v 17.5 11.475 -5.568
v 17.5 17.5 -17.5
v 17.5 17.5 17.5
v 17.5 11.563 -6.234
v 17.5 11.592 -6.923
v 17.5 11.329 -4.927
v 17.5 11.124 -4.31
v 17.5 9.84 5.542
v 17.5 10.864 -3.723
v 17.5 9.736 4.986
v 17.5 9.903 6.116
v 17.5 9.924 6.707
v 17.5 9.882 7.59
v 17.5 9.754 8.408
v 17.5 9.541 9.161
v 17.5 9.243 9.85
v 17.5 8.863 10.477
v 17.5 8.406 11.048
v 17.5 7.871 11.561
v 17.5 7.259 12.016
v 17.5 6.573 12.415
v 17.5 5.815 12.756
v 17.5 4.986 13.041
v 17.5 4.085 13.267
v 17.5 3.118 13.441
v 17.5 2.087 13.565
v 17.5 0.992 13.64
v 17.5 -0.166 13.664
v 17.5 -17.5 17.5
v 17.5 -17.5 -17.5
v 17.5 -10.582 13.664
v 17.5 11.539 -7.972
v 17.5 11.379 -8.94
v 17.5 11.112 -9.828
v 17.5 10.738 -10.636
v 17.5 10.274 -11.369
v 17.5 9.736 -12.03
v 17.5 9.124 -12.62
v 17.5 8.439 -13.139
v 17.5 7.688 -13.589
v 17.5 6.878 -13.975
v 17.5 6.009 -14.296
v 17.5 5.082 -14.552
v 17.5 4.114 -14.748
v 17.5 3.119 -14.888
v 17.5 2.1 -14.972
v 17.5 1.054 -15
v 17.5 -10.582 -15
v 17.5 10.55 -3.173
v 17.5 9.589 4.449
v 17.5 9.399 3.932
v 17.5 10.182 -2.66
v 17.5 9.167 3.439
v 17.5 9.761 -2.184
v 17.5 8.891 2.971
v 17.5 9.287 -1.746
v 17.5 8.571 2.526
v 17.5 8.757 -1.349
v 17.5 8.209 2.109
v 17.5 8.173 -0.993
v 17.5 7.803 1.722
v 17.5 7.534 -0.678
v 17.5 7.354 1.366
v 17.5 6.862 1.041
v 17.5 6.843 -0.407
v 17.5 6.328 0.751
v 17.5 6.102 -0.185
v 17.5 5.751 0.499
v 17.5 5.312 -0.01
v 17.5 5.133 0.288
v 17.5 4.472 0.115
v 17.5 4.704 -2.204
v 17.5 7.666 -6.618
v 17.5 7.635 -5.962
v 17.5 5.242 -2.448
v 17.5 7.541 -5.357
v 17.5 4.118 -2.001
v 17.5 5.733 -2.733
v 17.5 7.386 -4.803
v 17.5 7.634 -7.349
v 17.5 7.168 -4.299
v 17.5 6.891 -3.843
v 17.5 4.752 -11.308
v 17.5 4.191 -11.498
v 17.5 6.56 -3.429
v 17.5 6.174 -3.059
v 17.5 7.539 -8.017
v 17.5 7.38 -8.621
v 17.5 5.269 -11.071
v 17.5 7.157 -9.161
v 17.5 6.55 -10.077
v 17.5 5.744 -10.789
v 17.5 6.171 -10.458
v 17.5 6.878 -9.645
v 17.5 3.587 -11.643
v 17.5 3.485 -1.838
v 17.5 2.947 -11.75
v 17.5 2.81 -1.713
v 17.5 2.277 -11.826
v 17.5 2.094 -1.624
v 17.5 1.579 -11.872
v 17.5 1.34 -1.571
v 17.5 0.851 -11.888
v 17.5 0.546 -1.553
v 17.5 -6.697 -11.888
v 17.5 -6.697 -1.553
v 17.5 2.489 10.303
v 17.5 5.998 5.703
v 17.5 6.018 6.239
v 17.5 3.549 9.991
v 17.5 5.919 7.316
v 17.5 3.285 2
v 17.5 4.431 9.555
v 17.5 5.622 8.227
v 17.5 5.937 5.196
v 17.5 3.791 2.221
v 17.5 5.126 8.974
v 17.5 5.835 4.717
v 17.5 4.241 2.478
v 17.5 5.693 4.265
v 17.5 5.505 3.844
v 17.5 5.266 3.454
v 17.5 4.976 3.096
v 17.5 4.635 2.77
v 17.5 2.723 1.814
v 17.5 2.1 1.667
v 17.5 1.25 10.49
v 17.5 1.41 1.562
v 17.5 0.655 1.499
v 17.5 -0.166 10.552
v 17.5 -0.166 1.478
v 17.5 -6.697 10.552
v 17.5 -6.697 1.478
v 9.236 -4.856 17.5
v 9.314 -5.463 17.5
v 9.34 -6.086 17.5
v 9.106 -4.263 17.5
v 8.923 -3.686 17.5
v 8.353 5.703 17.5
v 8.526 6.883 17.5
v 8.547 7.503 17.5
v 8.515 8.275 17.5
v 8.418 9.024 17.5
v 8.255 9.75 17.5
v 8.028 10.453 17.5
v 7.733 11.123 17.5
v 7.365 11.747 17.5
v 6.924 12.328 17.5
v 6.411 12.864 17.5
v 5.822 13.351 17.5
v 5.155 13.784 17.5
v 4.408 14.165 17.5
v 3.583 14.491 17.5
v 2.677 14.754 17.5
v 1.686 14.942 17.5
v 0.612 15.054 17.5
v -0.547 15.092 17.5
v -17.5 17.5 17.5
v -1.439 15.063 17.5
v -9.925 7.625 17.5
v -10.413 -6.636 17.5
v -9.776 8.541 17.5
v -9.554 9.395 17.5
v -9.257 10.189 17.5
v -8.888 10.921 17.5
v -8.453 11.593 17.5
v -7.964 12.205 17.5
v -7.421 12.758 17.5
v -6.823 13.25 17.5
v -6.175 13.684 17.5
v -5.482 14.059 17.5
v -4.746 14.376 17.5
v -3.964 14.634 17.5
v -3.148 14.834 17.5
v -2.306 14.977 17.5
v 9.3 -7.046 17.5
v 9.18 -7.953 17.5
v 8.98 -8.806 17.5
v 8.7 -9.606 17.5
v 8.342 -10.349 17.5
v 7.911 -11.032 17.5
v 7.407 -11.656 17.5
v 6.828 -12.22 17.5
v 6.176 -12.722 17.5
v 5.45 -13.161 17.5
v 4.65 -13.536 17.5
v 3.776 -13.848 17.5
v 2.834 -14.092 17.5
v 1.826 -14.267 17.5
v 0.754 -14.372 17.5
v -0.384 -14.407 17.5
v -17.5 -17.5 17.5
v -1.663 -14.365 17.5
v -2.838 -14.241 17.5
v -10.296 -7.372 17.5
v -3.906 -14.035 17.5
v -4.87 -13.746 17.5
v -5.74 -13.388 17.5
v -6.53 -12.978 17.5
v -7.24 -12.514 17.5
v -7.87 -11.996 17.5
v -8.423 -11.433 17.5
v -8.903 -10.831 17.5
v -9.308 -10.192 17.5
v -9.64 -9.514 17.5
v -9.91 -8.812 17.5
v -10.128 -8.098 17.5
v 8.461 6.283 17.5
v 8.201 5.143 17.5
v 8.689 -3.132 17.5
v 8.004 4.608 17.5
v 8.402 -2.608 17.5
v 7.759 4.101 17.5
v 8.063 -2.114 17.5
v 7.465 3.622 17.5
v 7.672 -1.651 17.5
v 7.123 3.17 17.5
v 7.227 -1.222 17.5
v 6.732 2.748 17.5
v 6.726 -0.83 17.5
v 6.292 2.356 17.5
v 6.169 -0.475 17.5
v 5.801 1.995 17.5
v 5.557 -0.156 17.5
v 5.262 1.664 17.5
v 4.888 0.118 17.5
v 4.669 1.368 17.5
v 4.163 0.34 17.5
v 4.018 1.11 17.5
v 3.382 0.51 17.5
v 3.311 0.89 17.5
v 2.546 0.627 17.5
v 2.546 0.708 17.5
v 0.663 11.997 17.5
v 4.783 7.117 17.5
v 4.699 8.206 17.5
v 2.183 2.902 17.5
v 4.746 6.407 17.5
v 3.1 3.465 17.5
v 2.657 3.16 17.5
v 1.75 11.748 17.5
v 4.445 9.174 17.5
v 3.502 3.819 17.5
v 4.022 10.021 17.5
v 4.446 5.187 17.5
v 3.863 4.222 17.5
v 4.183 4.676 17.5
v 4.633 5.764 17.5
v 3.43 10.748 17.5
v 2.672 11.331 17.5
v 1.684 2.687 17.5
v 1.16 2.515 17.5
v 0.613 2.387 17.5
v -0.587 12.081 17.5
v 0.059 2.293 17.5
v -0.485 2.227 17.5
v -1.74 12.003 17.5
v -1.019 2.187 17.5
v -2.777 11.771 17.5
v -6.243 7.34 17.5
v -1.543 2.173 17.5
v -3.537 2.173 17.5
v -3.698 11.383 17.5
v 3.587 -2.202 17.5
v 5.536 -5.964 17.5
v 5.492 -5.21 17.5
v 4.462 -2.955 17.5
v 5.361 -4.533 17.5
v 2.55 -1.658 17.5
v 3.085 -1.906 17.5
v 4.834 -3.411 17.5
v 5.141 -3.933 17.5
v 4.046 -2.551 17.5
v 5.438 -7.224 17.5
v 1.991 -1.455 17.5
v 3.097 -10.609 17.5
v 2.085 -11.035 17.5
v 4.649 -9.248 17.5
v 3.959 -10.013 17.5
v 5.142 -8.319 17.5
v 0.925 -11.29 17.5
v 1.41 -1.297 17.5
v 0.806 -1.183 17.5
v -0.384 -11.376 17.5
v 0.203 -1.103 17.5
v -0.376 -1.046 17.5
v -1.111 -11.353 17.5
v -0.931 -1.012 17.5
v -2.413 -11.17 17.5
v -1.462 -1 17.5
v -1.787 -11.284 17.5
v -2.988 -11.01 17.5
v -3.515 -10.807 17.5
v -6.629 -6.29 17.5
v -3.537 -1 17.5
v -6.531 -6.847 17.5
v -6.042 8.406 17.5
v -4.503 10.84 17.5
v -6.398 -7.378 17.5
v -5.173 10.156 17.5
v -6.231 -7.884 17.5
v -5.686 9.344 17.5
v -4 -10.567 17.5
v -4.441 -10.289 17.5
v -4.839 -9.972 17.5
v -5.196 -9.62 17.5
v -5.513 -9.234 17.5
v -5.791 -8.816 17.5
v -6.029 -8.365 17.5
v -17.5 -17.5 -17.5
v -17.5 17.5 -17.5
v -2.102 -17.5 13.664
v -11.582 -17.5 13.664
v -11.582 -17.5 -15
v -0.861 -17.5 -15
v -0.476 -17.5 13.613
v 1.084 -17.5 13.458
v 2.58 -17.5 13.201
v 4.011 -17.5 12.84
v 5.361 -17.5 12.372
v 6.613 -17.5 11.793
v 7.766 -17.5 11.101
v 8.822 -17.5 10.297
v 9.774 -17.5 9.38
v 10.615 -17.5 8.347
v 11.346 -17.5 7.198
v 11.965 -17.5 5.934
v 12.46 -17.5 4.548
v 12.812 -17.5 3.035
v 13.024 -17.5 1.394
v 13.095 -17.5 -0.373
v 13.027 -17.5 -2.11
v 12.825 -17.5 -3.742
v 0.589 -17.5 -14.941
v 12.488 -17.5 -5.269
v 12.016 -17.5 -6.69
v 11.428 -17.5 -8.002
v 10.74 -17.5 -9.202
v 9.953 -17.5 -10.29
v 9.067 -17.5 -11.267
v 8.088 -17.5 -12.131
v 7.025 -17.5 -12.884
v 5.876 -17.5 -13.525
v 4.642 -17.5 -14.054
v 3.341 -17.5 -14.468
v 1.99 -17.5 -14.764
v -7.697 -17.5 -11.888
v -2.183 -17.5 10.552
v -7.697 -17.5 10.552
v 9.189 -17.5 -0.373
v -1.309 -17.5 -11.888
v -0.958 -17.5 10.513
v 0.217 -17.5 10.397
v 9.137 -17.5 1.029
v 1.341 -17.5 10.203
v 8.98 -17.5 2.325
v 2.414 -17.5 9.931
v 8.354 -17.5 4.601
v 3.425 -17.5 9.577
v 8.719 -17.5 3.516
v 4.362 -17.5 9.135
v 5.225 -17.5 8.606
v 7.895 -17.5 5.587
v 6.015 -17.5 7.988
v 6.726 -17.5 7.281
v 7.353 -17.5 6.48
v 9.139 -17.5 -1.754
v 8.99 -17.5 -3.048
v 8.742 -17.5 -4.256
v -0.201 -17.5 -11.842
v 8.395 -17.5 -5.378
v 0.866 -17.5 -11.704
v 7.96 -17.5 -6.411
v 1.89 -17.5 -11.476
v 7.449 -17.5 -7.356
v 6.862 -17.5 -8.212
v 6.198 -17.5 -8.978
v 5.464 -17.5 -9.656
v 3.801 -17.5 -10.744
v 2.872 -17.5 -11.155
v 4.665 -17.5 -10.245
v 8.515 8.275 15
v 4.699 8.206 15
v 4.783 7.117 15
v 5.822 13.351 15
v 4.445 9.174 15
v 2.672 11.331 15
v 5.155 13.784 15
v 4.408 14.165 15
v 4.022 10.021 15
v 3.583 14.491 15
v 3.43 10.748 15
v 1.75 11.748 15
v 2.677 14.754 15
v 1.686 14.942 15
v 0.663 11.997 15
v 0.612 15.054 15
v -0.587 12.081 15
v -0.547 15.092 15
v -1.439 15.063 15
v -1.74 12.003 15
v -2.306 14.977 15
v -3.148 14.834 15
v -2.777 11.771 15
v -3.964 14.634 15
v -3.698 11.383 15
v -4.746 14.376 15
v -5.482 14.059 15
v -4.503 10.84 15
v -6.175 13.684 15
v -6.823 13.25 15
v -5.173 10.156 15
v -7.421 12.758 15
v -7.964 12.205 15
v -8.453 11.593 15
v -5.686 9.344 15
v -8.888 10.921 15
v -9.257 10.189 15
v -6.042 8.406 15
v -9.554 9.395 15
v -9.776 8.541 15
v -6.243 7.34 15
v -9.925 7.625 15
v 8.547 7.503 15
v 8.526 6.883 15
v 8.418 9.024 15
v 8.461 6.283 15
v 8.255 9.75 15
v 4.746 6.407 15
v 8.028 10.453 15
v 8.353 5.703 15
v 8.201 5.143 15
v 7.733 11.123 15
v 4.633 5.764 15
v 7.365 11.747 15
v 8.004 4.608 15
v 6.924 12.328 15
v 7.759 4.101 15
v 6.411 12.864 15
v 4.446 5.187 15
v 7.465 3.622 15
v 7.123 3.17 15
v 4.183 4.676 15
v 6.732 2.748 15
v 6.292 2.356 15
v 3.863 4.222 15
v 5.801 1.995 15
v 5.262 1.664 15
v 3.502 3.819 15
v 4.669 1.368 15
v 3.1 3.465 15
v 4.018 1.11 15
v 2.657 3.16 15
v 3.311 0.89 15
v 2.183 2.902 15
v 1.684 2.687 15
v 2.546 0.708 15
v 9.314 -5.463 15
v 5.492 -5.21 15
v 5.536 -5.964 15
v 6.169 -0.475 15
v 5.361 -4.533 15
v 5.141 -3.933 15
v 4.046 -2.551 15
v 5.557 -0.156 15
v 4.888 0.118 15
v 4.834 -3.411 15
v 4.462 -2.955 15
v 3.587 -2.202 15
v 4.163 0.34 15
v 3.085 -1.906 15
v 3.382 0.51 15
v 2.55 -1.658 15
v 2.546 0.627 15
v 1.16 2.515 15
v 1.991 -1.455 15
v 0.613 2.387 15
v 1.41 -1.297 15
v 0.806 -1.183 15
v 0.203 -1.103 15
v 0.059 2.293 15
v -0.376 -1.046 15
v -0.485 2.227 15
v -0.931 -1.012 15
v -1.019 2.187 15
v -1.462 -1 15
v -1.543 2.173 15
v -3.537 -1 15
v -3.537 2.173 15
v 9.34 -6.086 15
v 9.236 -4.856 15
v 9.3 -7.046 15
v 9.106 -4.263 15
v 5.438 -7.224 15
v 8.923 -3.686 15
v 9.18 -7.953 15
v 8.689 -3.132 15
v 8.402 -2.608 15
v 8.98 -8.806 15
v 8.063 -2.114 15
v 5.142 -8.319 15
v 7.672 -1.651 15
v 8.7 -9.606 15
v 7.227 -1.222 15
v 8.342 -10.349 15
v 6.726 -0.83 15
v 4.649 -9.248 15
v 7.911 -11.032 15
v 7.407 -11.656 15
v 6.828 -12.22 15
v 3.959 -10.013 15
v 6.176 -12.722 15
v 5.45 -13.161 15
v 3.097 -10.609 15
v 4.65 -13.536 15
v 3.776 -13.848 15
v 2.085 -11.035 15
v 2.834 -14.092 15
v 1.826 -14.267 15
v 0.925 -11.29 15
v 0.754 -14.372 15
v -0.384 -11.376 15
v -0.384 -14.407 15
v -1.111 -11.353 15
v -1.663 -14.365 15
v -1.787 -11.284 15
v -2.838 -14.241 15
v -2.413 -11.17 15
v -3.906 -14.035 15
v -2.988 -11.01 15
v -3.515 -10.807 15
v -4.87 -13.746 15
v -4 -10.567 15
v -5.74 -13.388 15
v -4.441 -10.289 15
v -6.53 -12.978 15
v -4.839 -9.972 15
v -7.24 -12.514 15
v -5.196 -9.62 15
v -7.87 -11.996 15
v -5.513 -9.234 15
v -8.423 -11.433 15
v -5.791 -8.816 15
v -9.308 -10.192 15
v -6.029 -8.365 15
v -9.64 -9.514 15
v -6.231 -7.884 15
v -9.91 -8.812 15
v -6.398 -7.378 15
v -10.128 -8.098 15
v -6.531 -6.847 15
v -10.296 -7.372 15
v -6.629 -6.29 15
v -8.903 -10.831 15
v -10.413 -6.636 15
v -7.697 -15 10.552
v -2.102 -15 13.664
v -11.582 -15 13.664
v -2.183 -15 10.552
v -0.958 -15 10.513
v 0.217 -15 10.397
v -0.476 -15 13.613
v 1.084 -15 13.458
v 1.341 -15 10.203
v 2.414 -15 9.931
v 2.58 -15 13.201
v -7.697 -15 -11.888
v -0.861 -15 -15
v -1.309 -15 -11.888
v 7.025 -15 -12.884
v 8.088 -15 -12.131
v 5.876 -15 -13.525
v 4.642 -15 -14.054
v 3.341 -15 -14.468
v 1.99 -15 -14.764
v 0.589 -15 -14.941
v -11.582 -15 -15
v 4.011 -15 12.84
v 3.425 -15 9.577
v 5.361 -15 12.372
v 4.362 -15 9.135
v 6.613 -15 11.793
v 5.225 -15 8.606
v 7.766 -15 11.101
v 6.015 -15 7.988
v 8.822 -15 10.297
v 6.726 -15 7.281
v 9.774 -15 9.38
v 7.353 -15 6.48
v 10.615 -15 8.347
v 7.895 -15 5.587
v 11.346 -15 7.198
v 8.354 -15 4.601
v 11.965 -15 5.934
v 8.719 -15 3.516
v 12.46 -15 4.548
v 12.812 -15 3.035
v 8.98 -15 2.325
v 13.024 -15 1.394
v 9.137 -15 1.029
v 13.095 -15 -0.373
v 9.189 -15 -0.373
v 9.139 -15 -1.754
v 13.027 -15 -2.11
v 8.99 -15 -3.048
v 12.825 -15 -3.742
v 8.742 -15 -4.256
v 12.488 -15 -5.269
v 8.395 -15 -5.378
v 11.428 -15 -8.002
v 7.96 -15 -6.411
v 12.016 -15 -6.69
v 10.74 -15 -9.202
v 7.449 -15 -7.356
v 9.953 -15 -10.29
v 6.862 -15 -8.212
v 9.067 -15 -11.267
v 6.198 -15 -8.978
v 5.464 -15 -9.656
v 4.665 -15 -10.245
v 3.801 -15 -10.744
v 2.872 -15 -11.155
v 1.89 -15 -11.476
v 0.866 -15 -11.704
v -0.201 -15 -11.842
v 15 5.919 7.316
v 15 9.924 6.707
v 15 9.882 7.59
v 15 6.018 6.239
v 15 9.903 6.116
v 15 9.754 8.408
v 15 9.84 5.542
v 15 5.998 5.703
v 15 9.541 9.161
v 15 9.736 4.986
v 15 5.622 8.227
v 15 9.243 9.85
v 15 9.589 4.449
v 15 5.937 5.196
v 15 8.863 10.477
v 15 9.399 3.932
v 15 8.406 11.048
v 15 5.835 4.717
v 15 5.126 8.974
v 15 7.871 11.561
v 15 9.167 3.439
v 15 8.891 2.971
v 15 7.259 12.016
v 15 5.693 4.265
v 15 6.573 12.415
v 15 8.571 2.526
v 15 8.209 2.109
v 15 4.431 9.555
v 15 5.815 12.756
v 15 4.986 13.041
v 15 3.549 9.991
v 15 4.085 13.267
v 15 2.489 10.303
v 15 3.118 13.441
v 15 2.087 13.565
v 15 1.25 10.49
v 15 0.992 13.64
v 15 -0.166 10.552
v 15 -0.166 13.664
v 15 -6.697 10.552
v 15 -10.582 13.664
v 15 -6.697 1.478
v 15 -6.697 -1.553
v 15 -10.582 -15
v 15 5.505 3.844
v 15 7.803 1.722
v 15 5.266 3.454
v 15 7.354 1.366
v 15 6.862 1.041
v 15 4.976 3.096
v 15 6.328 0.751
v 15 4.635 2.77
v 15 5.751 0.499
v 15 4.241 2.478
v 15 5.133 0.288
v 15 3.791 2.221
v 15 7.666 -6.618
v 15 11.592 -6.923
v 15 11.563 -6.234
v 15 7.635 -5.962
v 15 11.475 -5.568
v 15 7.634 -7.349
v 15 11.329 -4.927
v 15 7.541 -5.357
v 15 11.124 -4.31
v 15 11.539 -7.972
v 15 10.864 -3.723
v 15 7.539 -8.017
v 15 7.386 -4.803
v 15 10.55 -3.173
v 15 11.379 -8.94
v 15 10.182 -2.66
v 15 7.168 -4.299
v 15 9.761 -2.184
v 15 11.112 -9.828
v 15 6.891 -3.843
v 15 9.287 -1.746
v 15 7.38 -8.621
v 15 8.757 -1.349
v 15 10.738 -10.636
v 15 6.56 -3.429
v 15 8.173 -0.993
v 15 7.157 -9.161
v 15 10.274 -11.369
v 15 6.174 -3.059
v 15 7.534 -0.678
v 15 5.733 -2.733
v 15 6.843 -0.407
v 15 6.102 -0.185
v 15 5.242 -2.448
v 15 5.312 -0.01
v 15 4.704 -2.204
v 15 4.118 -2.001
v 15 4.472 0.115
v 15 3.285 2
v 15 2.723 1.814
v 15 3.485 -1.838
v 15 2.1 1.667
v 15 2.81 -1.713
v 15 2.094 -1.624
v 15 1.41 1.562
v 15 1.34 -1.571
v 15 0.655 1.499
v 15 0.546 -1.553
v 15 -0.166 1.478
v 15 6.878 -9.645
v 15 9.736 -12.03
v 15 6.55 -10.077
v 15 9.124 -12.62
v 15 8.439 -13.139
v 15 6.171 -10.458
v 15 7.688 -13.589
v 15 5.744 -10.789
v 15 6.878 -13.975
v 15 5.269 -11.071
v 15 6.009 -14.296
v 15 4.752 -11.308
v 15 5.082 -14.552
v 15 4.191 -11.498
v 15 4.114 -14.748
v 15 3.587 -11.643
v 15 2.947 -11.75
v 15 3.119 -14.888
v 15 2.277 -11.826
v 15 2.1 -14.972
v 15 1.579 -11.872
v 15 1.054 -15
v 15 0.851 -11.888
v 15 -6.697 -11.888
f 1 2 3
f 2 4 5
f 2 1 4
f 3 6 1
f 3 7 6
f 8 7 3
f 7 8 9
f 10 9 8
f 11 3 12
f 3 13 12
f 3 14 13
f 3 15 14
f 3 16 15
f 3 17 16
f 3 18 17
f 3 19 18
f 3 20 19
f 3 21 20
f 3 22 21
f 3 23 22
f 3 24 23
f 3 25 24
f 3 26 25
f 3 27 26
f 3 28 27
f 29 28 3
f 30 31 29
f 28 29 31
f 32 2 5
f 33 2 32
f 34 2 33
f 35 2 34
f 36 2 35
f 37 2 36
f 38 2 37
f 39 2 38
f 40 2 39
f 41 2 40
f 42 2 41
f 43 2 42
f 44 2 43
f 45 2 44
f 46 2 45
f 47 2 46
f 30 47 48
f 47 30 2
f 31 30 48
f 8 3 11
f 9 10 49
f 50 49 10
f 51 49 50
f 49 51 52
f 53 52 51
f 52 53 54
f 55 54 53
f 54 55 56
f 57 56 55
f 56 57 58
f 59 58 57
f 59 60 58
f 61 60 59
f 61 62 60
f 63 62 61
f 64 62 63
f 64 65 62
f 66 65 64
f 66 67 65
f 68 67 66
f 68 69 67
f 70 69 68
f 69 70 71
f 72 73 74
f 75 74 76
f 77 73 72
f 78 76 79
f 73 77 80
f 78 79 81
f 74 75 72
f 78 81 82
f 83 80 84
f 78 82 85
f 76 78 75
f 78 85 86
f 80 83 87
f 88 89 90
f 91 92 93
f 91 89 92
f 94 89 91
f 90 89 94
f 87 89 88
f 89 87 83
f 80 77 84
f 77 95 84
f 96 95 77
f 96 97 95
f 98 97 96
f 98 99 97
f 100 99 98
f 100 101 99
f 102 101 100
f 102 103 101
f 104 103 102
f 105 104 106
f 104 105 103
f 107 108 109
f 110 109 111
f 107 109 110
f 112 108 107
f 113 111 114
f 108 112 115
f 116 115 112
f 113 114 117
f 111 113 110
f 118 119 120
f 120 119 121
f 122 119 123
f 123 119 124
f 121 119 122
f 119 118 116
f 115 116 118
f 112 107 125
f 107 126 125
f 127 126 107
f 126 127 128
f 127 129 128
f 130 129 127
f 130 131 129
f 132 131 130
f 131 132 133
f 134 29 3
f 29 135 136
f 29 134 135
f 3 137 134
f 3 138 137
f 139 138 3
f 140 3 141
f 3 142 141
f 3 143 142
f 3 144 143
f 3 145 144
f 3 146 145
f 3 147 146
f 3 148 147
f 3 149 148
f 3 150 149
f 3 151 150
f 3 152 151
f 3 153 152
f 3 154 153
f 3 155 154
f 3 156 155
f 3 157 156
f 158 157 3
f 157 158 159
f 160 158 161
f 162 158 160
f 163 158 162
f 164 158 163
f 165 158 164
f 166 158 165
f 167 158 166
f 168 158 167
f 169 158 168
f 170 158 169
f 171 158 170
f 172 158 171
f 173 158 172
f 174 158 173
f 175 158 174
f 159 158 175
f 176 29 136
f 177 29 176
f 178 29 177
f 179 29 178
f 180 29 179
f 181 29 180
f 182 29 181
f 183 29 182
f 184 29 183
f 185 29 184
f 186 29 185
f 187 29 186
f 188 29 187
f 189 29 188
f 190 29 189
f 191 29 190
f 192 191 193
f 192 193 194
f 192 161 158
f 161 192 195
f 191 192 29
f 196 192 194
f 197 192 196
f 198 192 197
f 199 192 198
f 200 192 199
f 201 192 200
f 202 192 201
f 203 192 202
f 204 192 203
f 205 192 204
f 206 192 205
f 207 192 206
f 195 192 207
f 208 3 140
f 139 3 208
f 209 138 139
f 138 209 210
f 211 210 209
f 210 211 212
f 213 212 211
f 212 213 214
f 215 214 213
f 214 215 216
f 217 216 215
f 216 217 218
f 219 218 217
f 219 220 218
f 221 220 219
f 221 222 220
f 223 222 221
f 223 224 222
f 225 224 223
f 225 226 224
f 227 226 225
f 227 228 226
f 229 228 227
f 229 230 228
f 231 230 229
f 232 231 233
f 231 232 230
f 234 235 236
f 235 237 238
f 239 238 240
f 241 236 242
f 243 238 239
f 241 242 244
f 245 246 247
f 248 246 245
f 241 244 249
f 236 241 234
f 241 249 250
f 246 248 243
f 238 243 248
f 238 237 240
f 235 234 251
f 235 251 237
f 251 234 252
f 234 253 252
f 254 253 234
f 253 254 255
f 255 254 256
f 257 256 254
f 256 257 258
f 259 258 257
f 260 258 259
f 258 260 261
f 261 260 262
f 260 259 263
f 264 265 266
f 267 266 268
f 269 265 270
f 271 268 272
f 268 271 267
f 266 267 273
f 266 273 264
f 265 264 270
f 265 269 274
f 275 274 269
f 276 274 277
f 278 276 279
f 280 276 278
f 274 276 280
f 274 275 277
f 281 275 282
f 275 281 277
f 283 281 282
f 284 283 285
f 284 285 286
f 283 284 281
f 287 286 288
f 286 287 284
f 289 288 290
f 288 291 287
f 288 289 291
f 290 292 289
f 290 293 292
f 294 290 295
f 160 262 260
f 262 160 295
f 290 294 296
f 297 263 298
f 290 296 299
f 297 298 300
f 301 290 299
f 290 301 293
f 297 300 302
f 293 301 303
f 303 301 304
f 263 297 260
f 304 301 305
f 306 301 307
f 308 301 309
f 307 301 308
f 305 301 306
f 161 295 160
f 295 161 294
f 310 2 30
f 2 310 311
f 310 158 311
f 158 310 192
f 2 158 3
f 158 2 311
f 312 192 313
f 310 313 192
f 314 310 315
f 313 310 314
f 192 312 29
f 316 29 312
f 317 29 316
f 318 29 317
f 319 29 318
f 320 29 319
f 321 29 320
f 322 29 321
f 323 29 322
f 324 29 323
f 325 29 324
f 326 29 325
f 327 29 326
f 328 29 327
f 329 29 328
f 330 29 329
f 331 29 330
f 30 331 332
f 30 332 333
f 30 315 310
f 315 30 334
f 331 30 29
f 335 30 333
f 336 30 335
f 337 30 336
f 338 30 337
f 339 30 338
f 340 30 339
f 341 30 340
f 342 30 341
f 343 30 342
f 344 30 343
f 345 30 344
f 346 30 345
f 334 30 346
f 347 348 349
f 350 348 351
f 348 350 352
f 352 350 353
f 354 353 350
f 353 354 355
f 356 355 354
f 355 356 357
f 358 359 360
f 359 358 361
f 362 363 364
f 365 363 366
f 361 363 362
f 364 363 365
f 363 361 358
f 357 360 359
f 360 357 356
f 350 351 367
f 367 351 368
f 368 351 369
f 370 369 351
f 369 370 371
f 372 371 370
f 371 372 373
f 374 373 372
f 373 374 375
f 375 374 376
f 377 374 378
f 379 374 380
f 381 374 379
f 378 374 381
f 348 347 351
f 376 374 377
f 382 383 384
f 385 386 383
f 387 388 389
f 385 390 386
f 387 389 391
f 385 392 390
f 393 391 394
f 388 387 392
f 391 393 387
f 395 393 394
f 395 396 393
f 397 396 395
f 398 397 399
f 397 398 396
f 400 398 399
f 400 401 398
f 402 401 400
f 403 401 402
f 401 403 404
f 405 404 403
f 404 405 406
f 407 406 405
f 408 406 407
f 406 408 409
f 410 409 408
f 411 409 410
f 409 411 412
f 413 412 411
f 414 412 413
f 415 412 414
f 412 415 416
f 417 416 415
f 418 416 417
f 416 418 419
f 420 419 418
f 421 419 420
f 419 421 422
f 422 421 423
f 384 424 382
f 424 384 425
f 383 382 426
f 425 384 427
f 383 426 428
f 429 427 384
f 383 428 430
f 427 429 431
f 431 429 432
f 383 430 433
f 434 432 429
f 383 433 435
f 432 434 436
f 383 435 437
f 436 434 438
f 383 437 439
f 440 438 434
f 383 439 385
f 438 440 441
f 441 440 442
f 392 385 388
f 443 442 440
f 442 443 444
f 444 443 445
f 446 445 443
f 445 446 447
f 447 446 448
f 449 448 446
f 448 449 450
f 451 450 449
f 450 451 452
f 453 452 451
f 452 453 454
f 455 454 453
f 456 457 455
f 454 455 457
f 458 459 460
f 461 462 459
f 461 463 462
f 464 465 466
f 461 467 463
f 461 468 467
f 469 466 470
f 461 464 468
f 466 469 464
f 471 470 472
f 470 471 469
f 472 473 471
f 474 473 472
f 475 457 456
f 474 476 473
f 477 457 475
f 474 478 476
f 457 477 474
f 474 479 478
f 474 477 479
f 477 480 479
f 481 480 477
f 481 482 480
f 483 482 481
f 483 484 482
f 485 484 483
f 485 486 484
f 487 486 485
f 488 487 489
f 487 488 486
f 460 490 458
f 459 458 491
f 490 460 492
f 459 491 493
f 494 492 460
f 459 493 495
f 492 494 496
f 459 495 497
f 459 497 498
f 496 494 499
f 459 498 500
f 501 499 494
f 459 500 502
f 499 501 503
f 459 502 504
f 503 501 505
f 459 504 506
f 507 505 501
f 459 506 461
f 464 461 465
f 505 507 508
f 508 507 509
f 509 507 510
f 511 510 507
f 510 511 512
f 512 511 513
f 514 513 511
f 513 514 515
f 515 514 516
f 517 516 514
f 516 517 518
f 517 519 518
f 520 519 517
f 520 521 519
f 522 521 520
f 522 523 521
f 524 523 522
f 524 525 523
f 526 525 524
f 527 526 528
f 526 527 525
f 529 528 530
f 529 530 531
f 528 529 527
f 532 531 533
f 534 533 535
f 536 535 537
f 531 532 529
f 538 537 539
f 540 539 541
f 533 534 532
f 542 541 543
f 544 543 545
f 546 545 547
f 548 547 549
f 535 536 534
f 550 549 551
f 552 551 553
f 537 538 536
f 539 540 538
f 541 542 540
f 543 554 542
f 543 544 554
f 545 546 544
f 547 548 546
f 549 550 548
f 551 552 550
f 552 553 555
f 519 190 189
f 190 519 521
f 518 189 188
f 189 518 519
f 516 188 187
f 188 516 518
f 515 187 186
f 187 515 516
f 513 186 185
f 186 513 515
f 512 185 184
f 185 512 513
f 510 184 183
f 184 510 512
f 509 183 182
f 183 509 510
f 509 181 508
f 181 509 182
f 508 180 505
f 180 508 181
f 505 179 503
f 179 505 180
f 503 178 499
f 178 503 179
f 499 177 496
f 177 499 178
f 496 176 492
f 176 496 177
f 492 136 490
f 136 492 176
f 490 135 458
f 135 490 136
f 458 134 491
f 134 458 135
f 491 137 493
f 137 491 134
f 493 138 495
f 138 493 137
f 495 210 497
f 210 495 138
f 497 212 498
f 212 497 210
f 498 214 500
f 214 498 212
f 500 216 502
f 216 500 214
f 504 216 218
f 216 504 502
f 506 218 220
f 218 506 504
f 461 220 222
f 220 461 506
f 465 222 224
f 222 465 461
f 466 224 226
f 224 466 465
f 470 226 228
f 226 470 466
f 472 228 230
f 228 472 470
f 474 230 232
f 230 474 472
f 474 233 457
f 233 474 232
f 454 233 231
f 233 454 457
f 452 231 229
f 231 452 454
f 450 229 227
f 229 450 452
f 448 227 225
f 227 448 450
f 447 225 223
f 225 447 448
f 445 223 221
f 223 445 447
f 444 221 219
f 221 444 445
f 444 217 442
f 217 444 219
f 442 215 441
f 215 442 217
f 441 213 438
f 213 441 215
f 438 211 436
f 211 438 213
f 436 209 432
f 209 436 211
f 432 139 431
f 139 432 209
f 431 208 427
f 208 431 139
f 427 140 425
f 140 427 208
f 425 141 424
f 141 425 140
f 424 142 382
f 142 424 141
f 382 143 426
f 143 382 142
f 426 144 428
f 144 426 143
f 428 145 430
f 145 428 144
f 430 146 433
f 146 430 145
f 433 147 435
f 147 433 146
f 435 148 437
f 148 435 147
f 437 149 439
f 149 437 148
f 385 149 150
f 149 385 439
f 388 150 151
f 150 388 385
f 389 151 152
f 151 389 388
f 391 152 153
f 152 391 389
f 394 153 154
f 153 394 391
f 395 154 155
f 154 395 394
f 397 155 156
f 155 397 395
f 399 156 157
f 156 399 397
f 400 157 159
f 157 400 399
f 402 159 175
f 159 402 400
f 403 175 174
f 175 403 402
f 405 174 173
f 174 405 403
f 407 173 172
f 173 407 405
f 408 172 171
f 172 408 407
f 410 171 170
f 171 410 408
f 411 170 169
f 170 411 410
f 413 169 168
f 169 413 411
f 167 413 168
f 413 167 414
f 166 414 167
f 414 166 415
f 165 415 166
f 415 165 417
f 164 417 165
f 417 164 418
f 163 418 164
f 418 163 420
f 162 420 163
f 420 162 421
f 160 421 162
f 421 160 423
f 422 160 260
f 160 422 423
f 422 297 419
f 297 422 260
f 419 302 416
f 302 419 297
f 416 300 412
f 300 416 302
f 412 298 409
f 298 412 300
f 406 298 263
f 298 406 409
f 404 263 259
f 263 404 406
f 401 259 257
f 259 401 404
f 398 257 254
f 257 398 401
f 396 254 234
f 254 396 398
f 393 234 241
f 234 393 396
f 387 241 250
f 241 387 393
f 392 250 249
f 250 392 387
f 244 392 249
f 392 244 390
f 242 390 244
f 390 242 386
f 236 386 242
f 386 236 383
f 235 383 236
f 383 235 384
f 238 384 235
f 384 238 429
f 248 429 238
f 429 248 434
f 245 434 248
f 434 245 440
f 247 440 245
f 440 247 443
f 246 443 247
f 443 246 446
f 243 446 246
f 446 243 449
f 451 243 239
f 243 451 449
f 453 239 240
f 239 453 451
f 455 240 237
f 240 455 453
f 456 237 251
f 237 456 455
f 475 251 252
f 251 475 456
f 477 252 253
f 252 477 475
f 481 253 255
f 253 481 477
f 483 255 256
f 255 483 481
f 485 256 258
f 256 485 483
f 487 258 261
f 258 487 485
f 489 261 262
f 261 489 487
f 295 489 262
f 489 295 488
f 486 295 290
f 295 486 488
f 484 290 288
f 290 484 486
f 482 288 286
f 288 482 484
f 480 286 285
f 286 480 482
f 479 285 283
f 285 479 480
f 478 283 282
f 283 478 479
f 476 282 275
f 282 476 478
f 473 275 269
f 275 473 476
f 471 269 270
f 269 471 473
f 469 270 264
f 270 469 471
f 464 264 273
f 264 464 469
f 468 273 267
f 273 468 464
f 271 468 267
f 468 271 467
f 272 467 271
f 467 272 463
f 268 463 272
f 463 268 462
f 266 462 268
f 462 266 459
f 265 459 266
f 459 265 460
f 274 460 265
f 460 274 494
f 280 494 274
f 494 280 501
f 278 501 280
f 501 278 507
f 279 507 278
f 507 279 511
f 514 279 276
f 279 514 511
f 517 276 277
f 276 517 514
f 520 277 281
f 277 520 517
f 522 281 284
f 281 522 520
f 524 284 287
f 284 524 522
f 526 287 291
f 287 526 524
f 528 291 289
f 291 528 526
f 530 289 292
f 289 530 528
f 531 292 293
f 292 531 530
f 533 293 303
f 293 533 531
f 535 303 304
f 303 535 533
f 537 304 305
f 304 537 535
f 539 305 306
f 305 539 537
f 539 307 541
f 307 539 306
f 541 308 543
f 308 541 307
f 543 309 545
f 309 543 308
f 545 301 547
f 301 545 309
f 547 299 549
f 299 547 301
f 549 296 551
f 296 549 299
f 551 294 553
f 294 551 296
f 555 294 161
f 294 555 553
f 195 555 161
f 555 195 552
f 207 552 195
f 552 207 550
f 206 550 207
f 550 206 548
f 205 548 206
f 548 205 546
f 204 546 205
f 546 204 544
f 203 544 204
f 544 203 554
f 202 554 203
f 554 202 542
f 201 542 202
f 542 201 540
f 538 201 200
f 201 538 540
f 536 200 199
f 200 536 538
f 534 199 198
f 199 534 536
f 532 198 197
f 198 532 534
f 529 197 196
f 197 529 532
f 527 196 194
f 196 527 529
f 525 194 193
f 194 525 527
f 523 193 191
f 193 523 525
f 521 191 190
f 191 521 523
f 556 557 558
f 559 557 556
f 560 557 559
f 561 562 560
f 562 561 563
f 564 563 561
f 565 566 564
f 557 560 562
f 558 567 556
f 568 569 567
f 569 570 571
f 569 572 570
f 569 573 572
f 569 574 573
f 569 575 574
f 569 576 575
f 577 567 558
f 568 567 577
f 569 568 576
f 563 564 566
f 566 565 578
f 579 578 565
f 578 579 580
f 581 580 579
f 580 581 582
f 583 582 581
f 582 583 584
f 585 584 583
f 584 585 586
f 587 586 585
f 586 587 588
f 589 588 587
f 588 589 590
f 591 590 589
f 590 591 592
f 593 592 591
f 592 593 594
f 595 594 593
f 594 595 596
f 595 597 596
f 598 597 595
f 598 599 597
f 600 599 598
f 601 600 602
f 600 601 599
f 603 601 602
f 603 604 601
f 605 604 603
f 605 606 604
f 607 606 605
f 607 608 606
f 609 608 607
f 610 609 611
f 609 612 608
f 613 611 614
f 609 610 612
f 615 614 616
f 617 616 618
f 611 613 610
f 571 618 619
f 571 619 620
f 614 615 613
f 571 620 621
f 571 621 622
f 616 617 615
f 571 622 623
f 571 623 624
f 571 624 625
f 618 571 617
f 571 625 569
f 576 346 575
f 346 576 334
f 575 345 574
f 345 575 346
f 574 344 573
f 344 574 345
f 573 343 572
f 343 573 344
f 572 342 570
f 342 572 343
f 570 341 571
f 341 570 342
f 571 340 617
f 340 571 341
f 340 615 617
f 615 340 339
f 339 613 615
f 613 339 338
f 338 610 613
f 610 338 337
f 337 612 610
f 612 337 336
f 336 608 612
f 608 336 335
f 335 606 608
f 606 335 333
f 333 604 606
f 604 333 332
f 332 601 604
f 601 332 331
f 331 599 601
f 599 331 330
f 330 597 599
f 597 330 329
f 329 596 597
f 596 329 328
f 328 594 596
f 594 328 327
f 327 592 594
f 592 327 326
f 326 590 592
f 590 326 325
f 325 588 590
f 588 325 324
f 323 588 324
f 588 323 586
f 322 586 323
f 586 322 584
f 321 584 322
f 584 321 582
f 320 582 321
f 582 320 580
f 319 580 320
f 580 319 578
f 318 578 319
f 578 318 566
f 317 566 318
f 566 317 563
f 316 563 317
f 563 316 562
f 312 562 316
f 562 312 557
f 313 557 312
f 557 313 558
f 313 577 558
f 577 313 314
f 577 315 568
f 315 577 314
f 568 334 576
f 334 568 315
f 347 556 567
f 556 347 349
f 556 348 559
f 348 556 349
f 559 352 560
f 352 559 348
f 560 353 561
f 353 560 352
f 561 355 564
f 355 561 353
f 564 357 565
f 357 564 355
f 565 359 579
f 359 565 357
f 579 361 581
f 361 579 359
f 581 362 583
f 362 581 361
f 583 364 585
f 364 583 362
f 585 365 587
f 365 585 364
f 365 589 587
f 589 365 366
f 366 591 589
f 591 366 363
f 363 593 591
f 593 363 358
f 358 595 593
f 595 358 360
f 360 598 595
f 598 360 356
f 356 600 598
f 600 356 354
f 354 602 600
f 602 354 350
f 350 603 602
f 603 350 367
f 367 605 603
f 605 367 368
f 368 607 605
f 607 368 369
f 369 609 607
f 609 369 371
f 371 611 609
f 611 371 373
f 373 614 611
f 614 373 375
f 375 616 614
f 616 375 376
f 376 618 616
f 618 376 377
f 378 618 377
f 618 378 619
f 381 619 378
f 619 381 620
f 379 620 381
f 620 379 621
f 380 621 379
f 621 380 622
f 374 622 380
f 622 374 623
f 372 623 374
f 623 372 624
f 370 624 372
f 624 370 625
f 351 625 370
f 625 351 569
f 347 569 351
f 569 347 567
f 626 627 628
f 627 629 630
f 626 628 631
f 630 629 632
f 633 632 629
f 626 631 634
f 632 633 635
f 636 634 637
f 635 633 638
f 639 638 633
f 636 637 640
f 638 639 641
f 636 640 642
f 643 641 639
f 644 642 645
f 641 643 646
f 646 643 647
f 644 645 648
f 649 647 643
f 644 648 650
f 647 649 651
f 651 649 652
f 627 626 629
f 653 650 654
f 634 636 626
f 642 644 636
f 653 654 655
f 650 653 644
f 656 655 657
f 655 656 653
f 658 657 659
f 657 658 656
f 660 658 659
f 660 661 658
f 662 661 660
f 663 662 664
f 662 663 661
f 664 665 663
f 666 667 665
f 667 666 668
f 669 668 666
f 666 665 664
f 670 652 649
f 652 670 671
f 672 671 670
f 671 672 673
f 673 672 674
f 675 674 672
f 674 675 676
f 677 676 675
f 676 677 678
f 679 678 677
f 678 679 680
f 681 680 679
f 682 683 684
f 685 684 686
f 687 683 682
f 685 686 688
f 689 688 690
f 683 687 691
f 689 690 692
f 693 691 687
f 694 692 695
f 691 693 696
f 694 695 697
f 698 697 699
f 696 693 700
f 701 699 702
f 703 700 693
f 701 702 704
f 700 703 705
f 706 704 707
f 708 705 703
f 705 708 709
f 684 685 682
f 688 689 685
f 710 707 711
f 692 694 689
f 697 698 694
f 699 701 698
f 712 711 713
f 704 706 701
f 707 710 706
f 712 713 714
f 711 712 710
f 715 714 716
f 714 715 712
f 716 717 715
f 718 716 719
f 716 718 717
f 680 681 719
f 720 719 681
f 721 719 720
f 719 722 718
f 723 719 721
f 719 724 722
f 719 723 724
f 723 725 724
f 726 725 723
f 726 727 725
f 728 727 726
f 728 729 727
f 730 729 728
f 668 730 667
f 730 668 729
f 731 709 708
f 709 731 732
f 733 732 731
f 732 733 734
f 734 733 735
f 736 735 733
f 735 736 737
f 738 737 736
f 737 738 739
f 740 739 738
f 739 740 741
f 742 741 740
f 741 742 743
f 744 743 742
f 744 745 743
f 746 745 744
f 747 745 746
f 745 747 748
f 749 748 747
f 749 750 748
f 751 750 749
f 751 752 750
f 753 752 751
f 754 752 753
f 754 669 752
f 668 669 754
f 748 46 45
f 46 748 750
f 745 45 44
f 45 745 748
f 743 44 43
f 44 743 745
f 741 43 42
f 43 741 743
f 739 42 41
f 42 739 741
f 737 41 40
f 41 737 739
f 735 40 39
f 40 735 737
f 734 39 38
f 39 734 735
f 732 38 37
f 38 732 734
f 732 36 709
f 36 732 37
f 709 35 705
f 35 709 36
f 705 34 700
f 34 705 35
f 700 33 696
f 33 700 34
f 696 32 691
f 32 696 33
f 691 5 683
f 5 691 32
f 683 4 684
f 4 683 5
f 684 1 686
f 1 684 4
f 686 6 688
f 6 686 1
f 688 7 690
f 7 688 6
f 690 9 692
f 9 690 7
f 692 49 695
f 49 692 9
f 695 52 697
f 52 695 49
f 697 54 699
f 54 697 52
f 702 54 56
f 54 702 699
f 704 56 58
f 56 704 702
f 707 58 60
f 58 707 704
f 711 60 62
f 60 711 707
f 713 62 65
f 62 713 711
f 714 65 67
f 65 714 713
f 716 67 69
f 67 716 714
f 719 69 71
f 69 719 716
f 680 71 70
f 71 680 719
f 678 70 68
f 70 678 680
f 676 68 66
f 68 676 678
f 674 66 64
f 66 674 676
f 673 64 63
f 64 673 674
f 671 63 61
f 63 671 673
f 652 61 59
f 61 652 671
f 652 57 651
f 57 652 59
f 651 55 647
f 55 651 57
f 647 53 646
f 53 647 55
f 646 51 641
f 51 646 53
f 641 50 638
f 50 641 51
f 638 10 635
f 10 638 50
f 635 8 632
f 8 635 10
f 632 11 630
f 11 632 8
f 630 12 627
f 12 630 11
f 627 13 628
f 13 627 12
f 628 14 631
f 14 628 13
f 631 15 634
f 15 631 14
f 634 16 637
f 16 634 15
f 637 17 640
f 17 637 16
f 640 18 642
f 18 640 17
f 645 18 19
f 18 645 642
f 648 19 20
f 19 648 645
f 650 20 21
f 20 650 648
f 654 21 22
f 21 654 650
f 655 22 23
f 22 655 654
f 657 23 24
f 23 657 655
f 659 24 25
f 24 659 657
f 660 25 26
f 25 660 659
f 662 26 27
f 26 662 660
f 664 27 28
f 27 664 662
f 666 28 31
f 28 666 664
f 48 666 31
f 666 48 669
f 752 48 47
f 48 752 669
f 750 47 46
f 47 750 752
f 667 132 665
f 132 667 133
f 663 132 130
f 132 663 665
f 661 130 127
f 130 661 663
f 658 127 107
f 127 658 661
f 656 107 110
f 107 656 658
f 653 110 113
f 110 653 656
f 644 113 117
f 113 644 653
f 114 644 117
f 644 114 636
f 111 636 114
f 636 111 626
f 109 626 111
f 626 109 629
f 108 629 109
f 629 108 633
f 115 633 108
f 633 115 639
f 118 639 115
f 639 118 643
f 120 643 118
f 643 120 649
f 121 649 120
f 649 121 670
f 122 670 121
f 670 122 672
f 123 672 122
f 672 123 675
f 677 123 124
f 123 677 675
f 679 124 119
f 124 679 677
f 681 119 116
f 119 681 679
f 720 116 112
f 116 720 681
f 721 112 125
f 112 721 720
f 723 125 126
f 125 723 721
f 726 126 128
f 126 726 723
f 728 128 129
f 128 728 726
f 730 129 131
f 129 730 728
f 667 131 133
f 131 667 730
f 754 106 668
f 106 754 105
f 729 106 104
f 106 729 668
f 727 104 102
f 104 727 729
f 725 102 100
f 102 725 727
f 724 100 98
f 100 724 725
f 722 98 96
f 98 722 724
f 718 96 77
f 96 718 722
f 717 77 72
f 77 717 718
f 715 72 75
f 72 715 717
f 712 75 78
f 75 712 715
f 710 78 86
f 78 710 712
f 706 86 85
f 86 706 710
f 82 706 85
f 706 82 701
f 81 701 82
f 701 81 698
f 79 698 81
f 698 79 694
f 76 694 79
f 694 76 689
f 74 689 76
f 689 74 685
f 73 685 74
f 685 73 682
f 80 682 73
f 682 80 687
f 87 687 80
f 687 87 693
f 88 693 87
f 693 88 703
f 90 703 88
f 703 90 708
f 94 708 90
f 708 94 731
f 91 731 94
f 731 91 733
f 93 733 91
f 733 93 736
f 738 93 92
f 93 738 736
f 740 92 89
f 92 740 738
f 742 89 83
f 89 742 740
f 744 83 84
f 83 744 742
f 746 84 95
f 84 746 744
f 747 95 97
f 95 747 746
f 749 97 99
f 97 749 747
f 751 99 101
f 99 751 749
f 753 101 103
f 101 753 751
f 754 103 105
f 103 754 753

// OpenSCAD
difference()
{
color ([0,0,0]) cube(35, true, $fn=100);

color ([1,0,0])
    translate([-12,-14,15]) 
        linear_extrude(10) text("3",size=30);
color ([0,1,0])
    translate([-15,-15,-15]) 
        rotate([90,0,0]) 
            linear_extrude(10) text("D",size=30);

color ([0,0,1])
    translate([15,-14,-15]) 
        rotate([90,0,90]) 
            linear_extrude(10) text("B",size=30);
}
